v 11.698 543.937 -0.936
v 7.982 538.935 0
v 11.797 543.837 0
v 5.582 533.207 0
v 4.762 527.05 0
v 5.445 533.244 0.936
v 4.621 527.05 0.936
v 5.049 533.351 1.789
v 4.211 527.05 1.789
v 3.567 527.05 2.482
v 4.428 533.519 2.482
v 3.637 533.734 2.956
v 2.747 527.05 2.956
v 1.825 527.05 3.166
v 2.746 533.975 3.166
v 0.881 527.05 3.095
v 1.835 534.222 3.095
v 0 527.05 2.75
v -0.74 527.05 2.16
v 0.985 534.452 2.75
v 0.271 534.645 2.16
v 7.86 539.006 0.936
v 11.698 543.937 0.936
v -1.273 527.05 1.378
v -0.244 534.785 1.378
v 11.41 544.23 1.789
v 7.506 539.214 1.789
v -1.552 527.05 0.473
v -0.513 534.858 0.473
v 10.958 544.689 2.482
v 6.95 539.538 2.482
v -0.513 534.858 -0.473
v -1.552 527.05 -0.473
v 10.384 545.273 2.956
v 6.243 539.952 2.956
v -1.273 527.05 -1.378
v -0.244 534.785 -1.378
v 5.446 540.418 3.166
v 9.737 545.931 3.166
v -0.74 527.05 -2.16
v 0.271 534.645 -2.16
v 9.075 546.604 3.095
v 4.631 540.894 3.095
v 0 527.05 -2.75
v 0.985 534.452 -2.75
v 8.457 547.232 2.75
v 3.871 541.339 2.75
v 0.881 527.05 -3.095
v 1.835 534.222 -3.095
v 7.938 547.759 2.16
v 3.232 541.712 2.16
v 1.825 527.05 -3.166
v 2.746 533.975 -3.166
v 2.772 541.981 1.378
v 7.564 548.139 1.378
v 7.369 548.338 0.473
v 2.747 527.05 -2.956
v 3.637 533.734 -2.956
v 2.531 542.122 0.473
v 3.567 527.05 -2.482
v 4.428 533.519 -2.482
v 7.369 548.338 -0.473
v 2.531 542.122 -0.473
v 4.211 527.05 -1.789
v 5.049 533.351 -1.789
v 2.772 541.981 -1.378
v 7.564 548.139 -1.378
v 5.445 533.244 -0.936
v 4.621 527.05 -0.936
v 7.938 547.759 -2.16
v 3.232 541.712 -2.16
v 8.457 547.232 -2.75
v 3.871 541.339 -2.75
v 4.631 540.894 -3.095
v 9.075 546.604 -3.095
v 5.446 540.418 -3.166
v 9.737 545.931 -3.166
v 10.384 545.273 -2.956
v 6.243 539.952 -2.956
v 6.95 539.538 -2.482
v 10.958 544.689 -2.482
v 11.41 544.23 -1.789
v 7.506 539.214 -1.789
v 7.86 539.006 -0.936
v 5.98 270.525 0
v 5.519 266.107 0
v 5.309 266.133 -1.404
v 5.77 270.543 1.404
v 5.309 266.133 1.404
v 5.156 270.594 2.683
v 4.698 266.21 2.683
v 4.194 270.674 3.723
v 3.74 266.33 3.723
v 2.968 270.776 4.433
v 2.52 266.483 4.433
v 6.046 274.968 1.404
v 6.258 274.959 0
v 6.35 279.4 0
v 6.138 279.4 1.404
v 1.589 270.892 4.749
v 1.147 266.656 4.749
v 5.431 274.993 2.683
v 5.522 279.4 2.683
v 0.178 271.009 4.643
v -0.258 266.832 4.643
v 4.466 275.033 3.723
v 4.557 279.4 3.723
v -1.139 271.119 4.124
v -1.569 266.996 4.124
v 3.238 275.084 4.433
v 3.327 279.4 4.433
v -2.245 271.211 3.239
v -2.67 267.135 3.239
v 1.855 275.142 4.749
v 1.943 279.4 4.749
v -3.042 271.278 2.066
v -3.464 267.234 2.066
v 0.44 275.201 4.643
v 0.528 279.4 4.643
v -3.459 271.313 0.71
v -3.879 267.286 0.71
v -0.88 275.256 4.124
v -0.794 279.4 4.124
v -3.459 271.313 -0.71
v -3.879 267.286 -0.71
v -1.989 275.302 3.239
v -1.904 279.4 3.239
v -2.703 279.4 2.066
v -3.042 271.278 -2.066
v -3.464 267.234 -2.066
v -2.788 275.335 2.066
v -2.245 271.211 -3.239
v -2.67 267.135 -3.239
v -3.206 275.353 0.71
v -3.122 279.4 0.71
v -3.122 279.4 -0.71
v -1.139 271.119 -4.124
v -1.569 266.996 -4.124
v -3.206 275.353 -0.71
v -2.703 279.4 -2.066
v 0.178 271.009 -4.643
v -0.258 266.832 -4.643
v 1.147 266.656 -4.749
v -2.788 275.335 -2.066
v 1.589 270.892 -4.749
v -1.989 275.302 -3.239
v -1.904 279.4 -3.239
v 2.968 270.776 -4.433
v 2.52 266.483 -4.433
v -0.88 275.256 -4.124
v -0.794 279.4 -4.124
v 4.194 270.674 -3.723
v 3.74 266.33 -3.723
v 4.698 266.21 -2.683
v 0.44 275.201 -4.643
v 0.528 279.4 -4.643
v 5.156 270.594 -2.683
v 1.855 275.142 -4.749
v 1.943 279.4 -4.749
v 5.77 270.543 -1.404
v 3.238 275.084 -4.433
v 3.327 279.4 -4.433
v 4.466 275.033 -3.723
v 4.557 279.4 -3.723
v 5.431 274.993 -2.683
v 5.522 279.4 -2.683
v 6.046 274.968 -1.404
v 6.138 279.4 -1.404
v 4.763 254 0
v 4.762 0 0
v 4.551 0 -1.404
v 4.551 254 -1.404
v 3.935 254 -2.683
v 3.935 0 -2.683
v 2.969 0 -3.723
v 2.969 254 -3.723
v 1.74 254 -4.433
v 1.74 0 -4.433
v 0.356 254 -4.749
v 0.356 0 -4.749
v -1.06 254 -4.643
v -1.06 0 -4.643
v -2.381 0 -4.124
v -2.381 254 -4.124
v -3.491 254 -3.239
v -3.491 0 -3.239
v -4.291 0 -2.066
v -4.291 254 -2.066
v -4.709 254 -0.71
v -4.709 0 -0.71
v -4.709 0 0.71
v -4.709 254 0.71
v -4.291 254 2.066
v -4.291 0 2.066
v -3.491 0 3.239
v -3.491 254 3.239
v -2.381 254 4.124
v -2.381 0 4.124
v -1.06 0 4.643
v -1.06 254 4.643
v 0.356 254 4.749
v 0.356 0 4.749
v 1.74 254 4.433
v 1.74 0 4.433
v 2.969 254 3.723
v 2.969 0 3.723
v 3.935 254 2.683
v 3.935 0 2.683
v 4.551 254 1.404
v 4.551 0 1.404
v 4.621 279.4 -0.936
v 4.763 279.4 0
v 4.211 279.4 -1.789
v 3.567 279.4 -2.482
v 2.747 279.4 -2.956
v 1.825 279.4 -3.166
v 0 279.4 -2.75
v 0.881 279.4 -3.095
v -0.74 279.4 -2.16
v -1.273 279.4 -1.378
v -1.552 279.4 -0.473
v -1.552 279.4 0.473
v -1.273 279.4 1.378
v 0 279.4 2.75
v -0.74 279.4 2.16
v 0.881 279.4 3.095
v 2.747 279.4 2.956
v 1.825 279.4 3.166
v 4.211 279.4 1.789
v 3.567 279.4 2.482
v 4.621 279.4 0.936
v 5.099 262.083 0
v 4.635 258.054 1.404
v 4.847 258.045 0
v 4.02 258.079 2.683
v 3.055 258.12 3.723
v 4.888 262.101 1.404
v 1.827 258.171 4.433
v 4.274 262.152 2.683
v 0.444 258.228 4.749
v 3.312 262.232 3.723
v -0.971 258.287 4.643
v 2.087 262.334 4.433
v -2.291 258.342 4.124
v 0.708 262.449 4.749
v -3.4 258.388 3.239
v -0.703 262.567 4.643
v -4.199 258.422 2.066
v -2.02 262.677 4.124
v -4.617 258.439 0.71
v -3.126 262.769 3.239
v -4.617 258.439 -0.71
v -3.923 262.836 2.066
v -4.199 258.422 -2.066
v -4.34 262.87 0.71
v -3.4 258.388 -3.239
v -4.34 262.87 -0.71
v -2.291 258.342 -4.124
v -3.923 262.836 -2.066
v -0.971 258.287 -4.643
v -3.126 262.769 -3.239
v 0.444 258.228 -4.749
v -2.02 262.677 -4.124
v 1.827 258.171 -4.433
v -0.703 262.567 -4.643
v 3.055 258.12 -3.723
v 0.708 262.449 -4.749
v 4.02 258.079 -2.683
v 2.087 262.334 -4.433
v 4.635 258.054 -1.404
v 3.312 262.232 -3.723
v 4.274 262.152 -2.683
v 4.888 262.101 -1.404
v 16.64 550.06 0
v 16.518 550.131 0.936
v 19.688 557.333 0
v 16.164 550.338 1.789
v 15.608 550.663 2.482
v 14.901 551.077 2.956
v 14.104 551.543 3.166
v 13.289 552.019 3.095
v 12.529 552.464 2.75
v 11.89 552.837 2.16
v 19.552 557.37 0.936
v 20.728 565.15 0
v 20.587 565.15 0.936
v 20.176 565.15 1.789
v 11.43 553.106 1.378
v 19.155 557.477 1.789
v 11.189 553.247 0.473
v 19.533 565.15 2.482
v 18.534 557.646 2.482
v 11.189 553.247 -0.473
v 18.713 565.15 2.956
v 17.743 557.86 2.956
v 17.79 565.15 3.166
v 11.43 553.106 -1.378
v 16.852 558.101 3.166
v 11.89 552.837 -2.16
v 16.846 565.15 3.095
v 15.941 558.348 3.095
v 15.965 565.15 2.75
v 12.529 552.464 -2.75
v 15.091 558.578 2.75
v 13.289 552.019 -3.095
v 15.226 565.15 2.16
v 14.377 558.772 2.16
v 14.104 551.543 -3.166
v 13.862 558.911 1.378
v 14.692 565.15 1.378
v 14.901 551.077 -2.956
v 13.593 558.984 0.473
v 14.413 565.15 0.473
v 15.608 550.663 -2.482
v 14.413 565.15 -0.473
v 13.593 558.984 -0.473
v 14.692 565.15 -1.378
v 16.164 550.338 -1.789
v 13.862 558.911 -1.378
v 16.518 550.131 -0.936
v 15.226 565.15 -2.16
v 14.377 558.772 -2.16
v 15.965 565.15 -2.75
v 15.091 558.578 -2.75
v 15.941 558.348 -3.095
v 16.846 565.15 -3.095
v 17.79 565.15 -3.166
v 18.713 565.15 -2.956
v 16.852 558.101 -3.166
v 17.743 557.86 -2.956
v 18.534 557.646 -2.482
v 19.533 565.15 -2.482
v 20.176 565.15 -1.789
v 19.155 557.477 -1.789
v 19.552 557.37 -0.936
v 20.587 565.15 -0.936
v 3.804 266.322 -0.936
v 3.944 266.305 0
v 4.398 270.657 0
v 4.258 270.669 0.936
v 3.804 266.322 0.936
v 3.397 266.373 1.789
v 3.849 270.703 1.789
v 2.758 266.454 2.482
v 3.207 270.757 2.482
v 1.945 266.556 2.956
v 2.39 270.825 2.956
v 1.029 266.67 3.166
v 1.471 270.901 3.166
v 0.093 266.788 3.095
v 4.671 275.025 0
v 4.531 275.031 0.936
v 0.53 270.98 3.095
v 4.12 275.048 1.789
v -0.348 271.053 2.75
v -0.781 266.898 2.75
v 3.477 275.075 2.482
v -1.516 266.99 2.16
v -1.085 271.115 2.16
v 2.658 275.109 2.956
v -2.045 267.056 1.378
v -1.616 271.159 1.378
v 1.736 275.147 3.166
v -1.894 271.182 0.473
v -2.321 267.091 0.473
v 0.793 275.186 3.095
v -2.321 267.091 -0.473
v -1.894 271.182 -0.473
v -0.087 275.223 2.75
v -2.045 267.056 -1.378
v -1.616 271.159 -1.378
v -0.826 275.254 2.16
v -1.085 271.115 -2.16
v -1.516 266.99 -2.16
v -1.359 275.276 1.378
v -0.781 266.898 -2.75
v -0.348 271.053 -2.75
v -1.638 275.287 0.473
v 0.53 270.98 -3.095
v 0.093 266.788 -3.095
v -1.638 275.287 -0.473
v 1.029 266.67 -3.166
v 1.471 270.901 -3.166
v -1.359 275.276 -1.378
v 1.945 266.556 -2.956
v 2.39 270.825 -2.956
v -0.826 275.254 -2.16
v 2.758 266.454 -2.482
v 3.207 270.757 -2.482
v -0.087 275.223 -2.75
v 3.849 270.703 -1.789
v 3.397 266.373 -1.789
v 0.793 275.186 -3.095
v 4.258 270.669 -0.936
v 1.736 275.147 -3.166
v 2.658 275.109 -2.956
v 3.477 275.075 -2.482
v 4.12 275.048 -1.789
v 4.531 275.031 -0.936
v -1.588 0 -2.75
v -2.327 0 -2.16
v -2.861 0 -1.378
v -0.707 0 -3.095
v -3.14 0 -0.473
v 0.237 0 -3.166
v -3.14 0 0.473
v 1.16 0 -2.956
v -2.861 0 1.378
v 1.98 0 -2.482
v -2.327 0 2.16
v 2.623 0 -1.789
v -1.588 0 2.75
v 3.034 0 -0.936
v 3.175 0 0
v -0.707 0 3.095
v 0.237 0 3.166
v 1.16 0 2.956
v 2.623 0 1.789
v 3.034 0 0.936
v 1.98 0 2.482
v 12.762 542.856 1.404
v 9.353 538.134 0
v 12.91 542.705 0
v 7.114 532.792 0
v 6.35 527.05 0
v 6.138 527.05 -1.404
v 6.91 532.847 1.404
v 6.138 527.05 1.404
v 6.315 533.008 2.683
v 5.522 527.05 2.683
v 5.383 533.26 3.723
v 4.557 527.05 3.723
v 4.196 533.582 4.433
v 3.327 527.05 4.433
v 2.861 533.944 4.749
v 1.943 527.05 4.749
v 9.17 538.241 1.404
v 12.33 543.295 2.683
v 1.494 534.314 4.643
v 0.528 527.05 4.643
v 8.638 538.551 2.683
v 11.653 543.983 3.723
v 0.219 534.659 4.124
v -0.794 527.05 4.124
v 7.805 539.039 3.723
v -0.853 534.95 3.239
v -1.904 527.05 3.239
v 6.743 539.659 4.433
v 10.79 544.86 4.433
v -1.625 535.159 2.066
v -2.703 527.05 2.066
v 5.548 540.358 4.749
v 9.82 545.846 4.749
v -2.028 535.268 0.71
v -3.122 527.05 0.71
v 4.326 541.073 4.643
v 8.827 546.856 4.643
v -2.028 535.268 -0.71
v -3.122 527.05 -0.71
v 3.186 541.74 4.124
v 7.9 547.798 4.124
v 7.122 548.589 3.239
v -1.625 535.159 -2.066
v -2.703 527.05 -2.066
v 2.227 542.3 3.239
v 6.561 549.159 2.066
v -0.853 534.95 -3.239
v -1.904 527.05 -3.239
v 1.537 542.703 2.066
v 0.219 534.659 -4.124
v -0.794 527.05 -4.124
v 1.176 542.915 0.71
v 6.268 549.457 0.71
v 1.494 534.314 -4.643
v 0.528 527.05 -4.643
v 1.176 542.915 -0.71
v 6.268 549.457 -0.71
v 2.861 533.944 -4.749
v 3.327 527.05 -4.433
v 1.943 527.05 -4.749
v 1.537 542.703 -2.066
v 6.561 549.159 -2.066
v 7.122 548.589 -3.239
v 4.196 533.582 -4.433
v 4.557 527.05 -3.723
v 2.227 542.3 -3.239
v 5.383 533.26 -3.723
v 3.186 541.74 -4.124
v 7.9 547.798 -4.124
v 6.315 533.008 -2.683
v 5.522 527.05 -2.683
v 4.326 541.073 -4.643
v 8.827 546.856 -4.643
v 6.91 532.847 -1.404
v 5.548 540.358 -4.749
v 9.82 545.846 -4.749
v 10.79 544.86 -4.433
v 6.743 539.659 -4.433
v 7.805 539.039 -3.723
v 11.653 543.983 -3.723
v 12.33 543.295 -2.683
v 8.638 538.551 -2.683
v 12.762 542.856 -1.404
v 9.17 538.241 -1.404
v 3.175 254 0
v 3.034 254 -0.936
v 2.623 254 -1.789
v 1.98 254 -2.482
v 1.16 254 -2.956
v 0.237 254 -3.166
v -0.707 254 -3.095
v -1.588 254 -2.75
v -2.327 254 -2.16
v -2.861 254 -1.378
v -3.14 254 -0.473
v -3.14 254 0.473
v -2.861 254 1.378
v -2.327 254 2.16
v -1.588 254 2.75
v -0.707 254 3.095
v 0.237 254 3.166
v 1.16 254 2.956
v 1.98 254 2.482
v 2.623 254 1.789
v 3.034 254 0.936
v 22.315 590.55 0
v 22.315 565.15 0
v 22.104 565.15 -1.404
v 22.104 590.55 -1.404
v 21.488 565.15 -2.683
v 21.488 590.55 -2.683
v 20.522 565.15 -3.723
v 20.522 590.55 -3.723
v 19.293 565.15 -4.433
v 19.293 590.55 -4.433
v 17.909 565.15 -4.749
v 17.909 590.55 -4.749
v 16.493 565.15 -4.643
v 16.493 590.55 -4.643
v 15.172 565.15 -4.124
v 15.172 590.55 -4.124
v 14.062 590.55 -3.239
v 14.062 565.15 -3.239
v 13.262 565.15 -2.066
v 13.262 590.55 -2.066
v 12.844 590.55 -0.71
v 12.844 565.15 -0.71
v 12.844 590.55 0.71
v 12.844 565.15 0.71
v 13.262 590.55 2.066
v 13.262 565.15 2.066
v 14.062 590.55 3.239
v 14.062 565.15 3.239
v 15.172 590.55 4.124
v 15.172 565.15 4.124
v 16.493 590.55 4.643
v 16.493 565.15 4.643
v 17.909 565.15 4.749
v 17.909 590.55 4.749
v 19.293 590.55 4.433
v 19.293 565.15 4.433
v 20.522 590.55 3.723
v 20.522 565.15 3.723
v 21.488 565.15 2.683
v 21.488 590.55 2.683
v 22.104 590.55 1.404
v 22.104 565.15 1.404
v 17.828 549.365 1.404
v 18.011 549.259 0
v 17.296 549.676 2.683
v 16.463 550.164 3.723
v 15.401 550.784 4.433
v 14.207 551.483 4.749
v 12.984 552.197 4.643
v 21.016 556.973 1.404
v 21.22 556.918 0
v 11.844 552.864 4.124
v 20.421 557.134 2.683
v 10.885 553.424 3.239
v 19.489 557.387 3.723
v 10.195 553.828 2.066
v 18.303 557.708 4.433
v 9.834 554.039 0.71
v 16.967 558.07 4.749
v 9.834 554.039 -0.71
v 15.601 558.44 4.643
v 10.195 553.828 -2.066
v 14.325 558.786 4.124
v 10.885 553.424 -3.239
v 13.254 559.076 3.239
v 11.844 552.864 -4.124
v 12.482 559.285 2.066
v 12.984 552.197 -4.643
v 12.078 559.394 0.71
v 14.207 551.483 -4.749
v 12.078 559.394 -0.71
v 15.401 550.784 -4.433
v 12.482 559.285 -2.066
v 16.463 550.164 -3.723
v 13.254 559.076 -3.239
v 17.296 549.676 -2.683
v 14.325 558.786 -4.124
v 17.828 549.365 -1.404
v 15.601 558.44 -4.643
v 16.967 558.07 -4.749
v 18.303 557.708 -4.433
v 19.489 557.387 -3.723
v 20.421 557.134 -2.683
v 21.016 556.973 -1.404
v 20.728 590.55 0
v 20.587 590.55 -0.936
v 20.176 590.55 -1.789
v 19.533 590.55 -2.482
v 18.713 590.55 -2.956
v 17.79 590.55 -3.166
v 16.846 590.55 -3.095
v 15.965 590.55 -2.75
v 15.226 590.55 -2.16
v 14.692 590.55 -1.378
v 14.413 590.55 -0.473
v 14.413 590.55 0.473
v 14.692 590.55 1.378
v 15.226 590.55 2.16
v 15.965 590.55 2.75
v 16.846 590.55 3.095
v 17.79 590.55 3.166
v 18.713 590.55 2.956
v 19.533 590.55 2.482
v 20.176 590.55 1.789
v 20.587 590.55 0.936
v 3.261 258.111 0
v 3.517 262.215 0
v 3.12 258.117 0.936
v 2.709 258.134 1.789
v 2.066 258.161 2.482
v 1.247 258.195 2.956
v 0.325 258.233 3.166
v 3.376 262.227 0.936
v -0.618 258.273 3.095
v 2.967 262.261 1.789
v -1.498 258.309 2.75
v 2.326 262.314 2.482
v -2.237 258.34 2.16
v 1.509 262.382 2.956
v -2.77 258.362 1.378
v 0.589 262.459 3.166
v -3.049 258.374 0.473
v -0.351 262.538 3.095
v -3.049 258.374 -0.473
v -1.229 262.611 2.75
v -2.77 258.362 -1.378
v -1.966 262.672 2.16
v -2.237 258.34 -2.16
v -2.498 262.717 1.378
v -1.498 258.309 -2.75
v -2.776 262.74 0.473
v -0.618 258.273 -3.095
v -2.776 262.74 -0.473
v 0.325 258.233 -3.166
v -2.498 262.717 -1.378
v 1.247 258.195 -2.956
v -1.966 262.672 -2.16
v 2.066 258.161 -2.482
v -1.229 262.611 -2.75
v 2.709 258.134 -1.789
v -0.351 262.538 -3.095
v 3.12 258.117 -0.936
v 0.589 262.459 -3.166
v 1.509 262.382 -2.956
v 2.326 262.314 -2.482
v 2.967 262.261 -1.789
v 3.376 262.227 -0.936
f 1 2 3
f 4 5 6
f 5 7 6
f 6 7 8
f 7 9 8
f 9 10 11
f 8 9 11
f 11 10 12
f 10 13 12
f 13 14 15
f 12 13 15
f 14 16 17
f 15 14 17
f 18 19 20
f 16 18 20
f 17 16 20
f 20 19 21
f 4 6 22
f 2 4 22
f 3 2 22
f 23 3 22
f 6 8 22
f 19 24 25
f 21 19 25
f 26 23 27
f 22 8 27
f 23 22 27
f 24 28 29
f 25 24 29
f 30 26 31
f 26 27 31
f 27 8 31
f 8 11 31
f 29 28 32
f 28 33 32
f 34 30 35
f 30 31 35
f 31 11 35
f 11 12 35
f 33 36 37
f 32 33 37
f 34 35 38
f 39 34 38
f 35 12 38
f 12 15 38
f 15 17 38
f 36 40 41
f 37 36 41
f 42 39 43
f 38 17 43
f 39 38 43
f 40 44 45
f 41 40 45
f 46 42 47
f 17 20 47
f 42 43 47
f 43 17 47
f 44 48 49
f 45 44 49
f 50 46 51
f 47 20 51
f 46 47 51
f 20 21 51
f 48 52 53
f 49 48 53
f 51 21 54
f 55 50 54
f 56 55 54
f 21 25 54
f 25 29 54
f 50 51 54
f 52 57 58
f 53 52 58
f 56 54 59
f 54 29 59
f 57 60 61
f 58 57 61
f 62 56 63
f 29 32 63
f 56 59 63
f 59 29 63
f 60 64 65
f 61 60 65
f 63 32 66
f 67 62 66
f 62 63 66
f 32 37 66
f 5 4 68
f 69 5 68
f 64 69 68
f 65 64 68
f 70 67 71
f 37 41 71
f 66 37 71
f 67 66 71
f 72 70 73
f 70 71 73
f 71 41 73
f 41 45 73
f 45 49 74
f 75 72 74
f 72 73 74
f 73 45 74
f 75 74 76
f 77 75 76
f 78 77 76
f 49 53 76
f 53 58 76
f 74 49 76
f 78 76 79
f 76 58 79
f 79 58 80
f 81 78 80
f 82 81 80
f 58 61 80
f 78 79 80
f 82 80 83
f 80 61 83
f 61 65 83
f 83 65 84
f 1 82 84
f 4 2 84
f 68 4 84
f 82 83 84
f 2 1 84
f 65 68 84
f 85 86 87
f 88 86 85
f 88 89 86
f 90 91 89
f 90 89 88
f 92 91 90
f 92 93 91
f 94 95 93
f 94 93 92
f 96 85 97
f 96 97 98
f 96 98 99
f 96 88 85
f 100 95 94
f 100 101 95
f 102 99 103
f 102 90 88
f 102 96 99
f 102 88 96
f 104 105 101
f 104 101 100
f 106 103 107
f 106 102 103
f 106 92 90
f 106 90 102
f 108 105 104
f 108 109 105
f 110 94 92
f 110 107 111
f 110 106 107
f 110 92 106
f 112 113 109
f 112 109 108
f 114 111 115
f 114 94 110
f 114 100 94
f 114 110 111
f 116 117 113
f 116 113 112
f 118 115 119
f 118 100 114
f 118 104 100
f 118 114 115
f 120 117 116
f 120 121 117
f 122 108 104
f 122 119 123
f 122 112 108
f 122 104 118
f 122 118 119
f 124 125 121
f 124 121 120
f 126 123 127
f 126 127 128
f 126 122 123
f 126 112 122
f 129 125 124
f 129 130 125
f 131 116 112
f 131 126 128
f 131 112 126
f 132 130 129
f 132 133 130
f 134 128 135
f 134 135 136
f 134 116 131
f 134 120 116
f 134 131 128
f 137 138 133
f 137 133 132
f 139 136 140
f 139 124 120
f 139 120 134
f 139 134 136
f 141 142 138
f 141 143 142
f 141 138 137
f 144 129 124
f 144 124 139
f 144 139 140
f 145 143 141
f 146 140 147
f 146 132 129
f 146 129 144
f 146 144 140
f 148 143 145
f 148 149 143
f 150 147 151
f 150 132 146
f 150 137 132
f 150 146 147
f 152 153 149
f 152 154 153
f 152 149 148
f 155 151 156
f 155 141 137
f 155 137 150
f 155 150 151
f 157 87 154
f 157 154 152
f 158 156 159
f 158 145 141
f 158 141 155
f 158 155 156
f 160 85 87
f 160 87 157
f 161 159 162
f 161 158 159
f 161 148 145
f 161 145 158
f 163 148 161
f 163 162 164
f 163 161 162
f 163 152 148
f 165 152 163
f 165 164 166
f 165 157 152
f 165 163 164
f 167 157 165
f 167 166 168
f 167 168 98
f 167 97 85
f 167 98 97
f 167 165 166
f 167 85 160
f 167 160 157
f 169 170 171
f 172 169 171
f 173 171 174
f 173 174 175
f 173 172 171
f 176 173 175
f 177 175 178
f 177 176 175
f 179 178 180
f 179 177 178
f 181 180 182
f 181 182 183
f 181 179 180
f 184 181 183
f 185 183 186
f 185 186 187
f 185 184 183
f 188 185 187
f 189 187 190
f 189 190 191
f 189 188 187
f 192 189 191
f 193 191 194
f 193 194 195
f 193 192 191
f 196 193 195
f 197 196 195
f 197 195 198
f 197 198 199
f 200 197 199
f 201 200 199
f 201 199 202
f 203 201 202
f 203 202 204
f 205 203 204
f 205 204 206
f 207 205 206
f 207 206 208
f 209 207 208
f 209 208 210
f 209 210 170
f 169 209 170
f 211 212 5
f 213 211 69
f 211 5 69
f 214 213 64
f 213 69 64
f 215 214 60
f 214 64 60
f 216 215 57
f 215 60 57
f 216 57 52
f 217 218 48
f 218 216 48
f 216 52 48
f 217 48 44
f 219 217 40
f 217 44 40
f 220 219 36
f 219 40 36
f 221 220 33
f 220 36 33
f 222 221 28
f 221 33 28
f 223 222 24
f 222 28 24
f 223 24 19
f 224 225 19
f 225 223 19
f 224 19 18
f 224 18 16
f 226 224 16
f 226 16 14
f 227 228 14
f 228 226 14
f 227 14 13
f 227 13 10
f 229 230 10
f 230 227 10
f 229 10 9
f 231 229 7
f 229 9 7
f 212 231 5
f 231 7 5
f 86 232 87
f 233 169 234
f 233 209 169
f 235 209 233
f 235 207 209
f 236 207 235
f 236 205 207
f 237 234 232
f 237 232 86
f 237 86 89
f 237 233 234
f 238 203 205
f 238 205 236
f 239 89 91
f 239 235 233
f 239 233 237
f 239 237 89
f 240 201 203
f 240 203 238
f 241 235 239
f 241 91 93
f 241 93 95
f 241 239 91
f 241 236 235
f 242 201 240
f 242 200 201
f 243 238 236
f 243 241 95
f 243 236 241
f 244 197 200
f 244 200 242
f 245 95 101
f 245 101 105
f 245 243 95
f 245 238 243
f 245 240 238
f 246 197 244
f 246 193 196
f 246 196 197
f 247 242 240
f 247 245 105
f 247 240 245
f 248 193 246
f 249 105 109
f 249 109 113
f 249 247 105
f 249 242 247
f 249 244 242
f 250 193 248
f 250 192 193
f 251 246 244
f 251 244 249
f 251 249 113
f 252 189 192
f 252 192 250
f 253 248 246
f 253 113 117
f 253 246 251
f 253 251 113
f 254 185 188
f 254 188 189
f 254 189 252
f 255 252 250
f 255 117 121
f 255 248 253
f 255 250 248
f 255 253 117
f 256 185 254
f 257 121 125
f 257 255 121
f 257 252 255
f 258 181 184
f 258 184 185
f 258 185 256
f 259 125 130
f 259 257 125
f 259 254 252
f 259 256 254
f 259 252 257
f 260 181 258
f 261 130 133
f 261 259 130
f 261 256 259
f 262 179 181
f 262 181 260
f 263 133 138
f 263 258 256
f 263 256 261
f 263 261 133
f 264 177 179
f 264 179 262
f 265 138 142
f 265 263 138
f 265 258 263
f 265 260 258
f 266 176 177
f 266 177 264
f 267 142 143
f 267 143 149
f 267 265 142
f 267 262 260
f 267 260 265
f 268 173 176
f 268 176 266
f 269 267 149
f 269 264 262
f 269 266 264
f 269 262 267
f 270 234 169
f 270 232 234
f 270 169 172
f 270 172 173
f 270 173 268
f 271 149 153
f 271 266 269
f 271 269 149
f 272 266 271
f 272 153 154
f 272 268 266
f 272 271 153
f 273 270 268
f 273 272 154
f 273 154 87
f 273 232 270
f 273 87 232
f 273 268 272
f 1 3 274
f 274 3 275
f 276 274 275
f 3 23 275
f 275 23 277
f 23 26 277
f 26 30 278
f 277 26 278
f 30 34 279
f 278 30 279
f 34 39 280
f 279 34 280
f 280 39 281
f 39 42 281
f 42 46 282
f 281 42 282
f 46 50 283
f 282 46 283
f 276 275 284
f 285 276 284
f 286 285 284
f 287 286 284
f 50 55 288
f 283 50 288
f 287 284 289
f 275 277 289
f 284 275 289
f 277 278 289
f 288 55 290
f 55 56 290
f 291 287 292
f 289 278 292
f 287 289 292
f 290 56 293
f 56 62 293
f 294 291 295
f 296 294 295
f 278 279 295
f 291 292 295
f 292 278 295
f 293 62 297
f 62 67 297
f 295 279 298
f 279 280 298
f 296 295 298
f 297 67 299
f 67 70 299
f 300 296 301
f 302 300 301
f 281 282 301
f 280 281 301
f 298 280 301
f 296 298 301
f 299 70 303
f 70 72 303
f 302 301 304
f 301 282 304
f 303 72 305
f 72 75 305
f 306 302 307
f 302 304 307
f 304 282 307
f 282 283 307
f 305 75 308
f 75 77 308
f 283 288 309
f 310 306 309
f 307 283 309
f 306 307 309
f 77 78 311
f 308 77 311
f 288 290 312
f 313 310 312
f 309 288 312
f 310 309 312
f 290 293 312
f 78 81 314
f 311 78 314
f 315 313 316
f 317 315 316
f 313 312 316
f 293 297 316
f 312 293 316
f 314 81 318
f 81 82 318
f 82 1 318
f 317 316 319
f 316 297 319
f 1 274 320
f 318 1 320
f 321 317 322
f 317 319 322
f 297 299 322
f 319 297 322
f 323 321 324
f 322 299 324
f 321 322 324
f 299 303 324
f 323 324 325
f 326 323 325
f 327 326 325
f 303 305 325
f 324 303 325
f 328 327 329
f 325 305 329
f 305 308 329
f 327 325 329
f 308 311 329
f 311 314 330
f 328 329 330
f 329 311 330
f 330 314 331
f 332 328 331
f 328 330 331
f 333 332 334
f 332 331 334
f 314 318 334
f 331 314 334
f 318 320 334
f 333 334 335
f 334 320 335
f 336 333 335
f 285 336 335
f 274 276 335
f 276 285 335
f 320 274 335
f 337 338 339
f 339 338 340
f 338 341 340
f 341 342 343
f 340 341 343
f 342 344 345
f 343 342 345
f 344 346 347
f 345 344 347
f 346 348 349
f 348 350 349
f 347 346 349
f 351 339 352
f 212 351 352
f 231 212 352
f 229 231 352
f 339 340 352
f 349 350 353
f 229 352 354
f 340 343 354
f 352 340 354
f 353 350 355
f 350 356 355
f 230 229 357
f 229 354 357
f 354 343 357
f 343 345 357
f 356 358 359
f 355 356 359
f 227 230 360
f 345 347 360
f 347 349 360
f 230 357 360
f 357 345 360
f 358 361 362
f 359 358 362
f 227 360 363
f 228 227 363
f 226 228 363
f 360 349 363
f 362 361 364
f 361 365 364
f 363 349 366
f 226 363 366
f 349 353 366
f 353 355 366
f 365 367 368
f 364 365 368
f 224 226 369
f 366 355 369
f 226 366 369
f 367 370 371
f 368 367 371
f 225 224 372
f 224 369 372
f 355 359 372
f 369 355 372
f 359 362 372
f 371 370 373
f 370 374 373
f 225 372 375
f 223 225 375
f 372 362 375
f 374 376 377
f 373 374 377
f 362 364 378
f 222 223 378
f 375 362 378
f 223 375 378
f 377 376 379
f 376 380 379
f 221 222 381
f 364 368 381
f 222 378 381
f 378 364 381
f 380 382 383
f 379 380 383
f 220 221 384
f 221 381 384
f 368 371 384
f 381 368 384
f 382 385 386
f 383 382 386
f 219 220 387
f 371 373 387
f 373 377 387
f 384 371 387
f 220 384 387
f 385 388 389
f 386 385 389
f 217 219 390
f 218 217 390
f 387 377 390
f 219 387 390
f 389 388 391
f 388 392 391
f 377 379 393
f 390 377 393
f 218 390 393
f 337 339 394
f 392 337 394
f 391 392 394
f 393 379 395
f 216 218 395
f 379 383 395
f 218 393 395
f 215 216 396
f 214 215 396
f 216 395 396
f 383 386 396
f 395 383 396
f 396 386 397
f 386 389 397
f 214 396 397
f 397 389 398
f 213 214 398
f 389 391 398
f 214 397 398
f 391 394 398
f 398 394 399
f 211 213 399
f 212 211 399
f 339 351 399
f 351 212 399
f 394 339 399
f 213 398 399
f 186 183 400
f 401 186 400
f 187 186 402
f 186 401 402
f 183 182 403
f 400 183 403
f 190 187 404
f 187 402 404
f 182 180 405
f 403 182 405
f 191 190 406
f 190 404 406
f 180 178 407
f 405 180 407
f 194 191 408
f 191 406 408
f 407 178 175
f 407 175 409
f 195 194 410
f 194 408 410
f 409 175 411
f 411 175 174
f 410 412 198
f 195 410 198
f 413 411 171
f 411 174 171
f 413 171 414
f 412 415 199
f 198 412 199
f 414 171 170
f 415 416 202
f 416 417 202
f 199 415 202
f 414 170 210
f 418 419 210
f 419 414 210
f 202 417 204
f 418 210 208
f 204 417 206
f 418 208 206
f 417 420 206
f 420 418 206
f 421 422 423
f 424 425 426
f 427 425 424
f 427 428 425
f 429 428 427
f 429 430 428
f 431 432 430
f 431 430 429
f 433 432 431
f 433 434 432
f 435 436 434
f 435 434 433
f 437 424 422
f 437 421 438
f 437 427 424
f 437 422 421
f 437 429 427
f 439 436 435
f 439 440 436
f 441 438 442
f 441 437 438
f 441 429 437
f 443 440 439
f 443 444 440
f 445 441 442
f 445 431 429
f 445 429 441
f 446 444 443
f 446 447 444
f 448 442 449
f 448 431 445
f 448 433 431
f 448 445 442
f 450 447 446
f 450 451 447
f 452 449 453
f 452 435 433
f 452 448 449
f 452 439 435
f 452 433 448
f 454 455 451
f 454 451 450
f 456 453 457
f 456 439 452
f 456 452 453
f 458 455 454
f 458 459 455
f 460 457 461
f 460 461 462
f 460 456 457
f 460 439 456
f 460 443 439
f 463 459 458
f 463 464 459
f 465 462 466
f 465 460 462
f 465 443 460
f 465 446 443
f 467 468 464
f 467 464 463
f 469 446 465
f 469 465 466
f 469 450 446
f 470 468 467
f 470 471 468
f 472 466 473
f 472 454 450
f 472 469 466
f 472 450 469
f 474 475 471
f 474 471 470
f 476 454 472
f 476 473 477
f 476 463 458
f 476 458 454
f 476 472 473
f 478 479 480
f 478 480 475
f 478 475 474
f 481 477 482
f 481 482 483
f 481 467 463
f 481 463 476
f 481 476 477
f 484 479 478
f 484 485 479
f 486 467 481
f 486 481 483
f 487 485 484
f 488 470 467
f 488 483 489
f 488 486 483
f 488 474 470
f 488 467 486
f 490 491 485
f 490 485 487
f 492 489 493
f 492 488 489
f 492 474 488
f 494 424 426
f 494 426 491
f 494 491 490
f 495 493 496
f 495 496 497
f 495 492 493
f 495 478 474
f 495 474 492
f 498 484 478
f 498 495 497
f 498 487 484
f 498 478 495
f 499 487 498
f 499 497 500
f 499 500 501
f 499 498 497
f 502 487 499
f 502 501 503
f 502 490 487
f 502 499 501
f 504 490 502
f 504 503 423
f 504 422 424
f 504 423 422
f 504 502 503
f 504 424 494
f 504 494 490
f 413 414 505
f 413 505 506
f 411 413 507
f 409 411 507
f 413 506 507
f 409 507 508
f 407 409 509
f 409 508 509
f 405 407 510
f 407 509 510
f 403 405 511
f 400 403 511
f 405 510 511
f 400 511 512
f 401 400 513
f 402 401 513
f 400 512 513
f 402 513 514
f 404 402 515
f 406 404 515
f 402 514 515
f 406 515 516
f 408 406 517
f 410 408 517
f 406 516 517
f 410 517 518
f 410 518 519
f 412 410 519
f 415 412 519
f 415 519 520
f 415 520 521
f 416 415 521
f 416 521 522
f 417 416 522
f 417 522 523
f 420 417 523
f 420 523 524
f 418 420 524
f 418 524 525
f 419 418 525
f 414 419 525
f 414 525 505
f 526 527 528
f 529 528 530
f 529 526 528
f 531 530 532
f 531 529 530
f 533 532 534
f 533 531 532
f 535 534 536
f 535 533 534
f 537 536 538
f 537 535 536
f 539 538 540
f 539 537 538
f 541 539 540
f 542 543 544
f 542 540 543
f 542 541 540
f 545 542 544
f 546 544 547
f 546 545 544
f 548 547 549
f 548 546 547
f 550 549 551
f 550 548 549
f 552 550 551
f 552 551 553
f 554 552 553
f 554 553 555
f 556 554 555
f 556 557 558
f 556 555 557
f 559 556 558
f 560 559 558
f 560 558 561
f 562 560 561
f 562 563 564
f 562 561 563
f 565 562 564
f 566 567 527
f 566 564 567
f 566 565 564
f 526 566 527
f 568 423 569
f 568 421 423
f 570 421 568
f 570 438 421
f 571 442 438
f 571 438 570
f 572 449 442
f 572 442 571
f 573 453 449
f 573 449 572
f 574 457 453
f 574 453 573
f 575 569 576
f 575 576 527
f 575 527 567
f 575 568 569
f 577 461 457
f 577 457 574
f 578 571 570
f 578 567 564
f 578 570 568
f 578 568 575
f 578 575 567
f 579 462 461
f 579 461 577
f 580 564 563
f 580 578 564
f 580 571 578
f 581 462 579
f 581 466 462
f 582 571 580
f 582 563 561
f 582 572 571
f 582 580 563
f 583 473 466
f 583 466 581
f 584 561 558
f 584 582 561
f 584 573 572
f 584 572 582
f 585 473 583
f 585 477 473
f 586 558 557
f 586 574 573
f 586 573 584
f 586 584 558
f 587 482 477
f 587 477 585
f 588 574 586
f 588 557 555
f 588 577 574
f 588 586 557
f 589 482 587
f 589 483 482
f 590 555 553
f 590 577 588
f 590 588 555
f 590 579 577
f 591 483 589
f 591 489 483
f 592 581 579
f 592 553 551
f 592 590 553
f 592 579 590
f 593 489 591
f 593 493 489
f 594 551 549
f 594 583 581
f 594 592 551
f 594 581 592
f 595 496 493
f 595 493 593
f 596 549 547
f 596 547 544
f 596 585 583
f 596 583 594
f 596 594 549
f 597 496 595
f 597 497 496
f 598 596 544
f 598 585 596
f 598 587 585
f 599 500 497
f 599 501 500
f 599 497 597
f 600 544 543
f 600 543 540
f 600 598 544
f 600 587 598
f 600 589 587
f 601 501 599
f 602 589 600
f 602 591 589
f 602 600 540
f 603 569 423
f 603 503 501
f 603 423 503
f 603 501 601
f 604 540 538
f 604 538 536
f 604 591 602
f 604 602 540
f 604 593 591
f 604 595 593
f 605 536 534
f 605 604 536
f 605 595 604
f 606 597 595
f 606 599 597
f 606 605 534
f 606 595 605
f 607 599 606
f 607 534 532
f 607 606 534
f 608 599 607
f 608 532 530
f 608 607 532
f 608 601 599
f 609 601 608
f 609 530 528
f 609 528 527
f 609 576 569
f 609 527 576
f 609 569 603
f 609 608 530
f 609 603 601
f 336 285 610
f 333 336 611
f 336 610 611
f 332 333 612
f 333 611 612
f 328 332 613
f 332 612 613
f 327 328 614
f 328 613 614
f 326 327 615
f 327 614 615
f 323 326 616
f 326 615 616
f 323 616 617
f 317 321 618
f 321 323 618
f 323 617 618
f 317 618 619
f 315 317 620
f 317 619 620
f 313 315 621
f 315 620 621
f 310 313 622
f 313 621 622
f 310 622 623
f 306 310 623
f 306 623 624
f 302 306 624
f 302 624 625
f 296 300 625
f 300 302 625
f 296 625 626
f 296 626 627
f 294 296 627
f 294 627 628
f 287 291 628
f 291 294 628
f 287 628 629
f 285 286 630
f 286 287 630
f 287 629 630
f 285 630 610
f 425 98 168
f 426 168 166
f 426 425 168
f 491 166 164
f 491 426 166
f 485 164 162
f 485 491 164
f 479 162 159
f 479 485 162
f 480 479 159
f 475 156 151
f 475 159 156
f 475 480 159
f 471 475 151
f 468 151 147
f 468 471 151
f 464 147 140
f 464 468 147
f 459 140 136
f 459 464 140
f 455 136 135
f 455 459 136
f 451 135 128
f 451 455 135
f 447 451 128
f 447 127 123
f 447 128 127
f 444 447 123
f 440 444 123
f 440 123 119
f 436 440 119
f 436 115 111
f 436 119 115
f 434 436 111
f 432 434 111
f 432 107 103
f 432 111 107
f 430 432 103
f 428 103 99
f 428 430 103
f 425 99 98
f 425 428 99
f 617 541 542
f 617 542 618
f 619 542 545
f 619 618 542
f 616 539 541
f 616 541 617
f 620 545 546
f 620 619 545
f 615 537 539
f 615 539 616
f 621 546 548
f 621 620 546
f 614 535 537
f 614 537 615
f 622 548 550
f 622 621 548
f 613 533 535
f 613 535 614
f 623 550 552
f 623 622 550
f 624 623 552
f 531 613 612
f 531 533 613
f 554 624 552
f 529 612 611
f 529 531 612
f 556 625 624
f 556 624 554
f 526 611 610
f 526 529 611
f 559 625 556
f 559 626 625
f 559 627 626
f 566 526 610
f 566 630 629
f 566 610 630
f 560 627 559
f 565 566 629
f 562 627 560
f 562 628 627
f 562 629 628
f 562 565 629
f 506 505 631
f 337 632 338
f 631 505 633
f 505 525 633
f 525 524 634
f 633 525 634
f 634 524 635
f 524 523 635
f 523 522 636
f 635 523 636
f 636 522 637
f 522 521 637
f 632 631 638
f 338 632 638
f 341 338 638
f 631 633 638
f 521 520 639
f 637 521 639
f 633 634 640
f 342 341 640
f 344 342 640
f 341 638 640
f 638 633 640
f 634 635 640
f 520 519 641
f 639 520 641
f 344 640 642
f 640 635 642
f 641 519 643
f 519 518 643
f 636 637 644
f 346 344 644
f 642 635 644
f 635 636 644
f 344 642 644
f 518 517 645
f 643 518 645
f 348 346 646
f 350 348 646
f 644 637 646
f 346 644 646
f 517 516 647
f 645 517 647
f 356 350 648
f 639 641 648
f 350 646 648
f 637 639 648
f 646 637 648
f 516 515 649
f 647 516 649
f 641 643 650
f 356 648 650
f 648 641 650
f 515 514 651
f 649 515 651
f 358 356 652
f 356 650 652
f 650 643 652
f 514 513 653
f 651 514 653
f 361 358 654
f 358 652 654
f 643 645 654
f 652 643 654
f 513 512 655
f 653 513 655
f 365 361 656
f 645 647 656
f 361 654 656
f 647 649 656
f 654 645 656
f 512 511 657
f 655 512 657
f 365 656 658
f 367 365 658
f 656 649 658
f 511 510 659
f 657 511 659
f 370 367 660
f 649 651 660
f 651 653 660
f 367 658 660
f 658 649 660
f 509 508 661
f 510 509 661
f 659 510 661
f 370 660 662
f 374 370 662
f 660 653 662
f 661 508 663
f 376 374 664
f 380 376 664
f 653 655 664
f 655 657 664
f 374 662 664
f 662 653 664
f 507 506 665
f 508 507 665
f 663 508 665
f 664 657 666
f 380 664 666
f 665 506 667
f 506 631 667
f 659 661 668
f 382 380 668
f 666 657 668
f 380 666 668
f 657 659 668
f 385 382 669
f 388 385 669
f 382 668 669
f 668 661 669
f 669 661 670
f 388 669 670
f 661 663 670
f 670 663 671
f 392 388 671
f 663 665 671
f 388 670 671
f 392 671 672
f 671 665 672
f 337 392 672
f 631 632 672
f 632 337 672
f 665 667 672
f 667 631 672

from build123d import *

# Parameters (mm, degrees)
SKETCH2_R   = 4.7625
SKETCH2_R_2 = 3.175


with BuildPart() as part:
    # Sweep1: sweep along a path in Sketch1
    with BuildLine(Plane.XY) as sweep1_path:
        Line((0, 0), (0, 254))
        ThreePointArc((0, 254), (0.198630909, 260.362390256), (0.79375, 266.7))
        ThreePointArc((0.79375, 266.7), (1.388869091, 273.037609744), (1.5875, 279.4))
        Line((1.5875, 279.4), (1.5875, 527.05))
        ThreePointArc((1.5875, 527.05), (3.663854401, 537.377471366), (9.570241337, 546.1))
        ThreePointArc((9.570241337, 546.1), (15.476628273, 554.822528634), (17.552982674, 565.15))
        Line((17.552982674, 565.15), (17.552982674, 590.55))
    # Sketch2 → Sweep1 (sweep)
    with BuildSketch(Plane(origin=(0, 0, 0), x_dir=(1, 0, 0), z_dir=(0, 1, 0))):
        Circle(SKETCH2_R)
        Circle(SKETCH2_R_2, mode=Mode.SUBTRACT)
    sweep(path=sweep1_path.line)


solid = part.part
